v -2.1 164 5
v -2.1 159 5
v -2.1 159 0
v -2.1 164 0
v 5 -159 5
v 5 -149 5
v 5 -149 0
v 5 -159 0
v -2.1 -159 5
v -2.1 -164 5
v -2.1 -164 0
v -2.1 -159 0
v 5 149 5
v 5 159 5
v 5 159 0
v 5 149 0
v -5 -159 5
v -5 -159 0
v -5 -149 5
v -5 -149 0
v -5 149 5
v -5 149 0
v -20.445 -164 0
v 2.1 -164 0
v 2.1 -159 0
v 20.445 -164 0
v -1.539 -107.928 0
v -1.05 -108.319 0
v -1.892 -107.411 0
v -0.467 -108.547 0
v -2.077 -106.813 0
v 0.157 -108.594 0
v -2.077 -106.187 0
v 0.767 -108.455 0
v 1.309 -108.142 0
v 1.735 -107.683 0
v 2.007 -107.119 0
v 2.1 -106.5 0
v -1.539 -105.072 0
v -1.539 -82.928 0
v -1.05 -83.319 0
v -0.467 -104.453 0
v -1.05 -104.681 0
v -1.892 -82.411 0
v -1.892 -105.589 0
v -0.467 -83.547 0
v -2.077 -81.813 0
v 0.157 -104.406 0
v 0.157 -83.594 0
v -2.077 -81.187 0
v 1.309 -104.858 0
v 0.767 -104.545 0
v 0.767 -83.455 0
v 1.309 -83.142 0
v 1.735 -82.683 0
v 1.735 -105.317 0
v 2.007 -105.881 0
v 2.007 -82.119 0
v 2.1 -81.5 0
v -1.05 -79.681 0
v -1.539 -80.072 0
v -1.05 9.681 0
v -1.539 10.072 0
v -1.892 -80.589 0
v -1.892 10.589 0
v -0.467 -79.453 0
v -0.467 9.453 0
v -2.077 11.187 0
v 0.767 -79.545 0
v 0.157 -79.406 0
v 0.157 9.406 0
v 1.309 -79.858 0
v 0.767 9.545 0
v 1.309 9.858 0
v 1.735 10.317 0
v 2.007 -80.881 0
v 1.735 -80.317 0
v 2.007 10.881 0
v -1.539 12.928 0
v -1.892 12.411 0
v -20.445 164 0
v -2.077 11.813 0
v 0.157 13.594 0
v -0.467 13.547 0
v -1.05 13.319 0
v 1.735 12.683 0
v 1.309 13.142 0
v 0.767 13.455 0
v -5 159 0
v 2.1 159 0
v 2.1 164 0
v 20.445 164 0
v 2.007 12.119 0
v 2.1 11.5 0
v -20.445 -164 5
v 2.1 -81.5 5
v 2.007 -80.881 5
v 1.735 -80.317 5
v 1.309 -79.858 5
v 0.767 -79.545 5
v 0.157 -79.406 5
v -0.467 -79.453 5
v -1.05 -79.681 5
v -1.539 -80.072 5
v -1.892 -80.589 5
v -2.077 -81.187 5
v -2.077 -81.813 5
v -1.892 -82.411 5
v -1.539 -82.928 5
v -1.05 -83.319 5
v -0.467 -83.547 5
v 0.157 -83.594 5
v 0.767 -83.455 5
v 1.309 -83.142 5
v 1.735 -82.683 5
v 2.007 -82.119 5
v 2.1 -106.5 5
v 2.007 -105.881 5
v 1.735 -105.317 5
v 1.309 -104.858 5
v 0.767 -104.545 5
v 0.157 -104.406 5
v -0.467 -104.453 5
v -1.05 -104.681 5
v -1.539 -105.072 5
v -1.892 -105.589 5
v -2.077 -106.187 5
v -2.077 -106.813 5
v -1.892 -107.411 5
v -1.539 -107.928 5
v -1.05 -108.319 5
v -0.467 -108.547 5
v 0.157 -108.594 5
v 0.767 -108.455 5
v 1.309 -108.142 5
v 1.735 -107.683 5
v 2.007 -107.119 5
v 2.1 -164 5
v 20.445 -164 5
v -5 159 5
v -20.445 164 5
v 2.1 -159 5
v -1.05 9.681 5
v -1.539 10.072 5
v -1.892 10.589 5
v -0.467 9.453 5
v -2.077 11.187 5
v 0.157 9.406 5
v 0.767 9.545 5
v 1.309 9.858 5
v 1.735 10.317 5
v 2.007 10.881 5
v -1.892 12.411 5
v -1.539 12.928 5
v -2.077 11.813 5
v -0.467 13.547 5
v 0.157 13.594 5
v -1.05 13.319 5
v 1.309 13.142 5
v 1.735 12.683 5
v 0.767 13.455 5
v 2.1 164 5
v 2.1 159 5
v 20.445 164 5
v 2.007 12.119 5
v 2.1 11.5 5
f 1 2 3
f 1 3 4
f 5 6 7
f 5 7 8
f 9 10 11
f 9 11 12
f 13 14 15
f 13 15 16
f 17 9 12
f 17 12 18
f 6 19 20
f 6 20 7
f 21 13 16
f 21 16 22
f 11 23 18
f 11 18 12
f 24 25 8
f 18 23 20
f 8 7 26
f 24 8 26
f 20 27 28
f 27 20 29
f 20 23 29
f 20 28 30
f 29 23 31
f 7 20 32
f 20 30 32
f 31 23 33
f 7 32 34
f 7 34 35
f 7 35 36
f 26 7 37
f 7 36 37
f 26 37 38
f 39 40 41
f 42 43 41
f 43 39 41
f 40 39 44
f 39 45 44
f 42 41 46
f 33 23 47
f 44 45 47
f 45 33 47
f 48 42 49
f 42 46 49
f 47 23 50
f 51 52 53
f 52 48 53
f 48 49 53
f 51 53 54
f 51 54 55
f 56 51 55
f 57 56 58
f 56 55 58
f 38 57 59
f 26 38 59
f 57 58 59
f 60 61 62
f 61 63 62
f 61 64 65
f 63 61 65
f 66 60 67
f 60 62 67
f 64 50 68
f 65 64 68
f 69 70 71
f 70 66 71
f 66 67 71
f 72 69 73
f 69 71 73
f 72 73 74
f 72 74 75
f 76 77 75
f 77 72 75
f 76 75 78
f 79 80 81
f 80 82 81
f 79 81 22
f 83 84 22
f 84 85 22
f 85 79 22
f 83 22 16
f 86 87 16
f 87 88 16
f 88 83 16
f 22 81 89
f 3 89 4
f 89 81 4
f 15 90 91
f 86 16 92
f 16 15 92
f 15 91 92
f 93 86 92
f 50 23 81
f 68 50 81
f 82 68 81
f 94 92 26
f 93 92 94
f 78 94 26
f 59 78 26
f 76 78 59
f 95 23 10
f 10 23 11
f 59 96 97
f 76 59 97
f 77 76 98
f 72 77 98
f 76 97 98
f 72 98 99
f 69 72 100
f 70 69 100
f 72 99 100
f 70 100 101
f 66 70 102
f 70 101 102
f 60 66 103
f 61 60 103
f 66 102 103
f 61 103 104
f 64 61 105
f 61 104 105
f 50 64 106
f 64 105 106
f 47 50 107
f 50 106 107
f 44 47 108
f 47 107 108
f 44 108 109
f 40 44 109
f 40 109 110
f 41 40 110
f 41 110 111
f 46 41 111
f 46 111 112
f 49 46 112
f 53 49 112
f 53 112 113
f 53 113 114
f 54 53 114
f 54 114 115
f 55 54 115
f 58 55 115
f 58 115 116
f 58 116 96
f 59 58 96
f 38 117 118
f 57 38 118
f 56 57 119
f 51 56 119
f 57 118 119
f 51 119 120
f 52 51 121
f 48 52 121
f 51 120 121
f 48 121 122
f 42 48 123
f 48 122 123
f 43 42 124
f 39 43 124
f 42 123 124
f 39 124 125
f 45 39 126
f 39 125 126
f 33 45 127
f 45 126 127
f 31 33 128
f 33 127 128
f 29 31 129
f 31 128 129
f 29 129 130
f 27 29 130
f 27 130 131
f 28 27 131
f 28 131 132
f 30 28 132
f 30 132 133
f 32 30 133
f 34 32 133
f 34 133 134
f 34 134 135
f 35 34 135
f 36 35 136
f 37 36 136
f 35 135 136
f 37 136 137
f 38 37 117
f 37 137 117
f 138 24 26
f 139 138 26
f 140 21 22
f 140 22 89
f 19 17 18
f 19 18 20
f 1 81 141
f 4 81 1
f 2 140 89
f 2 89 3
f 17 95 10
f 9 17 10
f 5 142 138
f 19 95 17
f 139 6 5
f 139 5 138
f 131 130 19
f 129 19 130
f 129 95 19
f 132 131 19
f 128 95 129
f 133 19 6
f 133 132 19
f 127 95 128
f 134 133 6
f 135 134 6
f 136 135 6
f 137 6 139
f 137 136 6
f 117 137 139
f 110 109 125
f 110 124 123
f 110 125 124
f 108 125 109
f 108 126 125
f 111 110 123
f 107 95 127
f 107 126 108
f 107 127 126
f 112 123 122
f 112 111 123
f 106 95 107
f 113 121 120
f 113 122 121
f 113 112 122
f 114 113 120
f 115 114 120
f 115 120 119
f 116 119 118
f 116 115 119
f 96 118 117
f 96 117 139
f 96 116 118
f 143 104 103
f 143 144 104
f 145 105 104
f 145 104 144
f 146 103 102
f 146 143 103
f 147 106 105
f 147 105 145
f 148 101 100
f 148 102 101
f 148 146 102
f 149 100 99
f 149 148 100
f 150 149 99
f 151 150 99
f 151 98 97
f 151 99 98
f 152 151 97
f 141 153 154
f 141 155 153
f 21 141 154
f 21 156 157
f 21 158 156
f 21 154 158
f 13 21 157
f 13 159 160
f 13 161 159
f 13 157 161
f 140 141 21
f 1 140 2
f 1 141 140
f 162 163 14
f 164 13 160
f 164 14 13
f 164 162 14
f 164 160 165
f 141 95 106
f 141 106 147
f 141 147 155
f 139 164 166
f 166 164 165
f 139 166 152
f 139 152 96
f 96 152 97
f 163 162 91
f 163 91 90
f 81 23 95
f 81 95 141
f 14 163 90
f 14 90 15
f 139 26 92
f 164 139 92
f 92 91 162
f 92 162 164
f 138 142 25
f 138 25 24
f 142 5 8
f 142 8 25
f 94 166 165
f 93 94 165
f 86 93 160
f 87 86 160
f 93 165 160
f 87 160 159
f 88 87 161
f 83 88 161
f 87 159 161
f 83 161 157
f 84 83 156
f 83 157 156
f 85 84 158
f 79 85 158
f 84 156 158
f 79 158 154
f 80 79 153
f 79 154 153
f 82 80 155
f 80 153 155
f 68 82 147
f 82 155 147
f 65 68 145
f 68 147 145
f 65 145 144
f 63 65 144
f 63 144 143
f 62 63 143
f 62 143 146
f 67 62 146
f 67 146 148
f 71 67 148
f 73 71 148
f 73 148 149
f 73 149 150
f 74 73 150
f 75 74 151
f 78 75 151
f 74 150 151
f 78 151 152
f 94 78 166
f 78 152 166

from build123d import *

# Parameters (mm, degrees)
SKETCH1_W           = 40.89
SKETCH1_H           = 328
BOSS_EXTRUDE1_DEPTH = 5
SKETCH2_R           = 2.1
CUT_EXTRUDE1_DEPTH  = 10
CUT_EXTRUDE2_DEPTH  = 10
SKETCH4_R           = 2.1
CUT_EXTRUDE3_DEPTH  = 5
SKETCH5_R           = 2.1
CUT_EXTRUDE4_DEPTH  = 5


with BuildPart() as part:
    # Sketch1 → Boss-Extrude1 (new body)
    with BuildSketch(Plane.XY):
        Rectangle(SKETCH1_W, SKETCH1_H)
    extrude(amount=BOSS_EXTRUDE1_DEPTH)

    # Sketch2 → Cut-Extrude1 (cut)
    with BuildSketch(Plane.XY.offset(5)):
        with Locations((0, -81.5)):
            Circle(SKETCH2_R)
    extrude(amount=-CUT_EXTRUDE1_DEPTH, mode=Mode.SUBTRACT)

    # Sketch3 → Cut-Extrude2 (cut)
    with BuildSketch(Plane.XY.offset(5)):
        Polygon((-2.1, -164), (-2.1, -159), (-5, -159), (-5, -149), (5, -149), (5, -159), (2.1, -159), (2.1, -164), align=None)
        Polygon((2.1, 164), (2.1, 159), (5, 159), (5, 149), (-5, 149), (-5, 159), (-2.1, 159), (-2.1, 164), align=None)
    extrude(amount=-CUT_EXTRUDE2_DEPTH, mode=Mode.SUBTRACT)

    # Sketch4 → Cut-Extrude3 (cut)
    with BuildSketch(Plane.XY.offset(5)):
        with Locations((0, -106.5)):
            Circle(SKETCH4_R)
    extrude(amount=-CUT_EXTRUDE3_DEPTH, mode=Mode.SUBTRACT)

    # Sketch5 → Cut-Extrude4 (cut)
    with BuildSketch(Plane.XY.offset(5)):
        with Locations((0, 11.5)):
            Circle(SKETCH5_R)
    extrude(amount=-CUT_EXTRUDE4_DEPTH, mode=Mode.SUBTRACT)


solid = part.part
